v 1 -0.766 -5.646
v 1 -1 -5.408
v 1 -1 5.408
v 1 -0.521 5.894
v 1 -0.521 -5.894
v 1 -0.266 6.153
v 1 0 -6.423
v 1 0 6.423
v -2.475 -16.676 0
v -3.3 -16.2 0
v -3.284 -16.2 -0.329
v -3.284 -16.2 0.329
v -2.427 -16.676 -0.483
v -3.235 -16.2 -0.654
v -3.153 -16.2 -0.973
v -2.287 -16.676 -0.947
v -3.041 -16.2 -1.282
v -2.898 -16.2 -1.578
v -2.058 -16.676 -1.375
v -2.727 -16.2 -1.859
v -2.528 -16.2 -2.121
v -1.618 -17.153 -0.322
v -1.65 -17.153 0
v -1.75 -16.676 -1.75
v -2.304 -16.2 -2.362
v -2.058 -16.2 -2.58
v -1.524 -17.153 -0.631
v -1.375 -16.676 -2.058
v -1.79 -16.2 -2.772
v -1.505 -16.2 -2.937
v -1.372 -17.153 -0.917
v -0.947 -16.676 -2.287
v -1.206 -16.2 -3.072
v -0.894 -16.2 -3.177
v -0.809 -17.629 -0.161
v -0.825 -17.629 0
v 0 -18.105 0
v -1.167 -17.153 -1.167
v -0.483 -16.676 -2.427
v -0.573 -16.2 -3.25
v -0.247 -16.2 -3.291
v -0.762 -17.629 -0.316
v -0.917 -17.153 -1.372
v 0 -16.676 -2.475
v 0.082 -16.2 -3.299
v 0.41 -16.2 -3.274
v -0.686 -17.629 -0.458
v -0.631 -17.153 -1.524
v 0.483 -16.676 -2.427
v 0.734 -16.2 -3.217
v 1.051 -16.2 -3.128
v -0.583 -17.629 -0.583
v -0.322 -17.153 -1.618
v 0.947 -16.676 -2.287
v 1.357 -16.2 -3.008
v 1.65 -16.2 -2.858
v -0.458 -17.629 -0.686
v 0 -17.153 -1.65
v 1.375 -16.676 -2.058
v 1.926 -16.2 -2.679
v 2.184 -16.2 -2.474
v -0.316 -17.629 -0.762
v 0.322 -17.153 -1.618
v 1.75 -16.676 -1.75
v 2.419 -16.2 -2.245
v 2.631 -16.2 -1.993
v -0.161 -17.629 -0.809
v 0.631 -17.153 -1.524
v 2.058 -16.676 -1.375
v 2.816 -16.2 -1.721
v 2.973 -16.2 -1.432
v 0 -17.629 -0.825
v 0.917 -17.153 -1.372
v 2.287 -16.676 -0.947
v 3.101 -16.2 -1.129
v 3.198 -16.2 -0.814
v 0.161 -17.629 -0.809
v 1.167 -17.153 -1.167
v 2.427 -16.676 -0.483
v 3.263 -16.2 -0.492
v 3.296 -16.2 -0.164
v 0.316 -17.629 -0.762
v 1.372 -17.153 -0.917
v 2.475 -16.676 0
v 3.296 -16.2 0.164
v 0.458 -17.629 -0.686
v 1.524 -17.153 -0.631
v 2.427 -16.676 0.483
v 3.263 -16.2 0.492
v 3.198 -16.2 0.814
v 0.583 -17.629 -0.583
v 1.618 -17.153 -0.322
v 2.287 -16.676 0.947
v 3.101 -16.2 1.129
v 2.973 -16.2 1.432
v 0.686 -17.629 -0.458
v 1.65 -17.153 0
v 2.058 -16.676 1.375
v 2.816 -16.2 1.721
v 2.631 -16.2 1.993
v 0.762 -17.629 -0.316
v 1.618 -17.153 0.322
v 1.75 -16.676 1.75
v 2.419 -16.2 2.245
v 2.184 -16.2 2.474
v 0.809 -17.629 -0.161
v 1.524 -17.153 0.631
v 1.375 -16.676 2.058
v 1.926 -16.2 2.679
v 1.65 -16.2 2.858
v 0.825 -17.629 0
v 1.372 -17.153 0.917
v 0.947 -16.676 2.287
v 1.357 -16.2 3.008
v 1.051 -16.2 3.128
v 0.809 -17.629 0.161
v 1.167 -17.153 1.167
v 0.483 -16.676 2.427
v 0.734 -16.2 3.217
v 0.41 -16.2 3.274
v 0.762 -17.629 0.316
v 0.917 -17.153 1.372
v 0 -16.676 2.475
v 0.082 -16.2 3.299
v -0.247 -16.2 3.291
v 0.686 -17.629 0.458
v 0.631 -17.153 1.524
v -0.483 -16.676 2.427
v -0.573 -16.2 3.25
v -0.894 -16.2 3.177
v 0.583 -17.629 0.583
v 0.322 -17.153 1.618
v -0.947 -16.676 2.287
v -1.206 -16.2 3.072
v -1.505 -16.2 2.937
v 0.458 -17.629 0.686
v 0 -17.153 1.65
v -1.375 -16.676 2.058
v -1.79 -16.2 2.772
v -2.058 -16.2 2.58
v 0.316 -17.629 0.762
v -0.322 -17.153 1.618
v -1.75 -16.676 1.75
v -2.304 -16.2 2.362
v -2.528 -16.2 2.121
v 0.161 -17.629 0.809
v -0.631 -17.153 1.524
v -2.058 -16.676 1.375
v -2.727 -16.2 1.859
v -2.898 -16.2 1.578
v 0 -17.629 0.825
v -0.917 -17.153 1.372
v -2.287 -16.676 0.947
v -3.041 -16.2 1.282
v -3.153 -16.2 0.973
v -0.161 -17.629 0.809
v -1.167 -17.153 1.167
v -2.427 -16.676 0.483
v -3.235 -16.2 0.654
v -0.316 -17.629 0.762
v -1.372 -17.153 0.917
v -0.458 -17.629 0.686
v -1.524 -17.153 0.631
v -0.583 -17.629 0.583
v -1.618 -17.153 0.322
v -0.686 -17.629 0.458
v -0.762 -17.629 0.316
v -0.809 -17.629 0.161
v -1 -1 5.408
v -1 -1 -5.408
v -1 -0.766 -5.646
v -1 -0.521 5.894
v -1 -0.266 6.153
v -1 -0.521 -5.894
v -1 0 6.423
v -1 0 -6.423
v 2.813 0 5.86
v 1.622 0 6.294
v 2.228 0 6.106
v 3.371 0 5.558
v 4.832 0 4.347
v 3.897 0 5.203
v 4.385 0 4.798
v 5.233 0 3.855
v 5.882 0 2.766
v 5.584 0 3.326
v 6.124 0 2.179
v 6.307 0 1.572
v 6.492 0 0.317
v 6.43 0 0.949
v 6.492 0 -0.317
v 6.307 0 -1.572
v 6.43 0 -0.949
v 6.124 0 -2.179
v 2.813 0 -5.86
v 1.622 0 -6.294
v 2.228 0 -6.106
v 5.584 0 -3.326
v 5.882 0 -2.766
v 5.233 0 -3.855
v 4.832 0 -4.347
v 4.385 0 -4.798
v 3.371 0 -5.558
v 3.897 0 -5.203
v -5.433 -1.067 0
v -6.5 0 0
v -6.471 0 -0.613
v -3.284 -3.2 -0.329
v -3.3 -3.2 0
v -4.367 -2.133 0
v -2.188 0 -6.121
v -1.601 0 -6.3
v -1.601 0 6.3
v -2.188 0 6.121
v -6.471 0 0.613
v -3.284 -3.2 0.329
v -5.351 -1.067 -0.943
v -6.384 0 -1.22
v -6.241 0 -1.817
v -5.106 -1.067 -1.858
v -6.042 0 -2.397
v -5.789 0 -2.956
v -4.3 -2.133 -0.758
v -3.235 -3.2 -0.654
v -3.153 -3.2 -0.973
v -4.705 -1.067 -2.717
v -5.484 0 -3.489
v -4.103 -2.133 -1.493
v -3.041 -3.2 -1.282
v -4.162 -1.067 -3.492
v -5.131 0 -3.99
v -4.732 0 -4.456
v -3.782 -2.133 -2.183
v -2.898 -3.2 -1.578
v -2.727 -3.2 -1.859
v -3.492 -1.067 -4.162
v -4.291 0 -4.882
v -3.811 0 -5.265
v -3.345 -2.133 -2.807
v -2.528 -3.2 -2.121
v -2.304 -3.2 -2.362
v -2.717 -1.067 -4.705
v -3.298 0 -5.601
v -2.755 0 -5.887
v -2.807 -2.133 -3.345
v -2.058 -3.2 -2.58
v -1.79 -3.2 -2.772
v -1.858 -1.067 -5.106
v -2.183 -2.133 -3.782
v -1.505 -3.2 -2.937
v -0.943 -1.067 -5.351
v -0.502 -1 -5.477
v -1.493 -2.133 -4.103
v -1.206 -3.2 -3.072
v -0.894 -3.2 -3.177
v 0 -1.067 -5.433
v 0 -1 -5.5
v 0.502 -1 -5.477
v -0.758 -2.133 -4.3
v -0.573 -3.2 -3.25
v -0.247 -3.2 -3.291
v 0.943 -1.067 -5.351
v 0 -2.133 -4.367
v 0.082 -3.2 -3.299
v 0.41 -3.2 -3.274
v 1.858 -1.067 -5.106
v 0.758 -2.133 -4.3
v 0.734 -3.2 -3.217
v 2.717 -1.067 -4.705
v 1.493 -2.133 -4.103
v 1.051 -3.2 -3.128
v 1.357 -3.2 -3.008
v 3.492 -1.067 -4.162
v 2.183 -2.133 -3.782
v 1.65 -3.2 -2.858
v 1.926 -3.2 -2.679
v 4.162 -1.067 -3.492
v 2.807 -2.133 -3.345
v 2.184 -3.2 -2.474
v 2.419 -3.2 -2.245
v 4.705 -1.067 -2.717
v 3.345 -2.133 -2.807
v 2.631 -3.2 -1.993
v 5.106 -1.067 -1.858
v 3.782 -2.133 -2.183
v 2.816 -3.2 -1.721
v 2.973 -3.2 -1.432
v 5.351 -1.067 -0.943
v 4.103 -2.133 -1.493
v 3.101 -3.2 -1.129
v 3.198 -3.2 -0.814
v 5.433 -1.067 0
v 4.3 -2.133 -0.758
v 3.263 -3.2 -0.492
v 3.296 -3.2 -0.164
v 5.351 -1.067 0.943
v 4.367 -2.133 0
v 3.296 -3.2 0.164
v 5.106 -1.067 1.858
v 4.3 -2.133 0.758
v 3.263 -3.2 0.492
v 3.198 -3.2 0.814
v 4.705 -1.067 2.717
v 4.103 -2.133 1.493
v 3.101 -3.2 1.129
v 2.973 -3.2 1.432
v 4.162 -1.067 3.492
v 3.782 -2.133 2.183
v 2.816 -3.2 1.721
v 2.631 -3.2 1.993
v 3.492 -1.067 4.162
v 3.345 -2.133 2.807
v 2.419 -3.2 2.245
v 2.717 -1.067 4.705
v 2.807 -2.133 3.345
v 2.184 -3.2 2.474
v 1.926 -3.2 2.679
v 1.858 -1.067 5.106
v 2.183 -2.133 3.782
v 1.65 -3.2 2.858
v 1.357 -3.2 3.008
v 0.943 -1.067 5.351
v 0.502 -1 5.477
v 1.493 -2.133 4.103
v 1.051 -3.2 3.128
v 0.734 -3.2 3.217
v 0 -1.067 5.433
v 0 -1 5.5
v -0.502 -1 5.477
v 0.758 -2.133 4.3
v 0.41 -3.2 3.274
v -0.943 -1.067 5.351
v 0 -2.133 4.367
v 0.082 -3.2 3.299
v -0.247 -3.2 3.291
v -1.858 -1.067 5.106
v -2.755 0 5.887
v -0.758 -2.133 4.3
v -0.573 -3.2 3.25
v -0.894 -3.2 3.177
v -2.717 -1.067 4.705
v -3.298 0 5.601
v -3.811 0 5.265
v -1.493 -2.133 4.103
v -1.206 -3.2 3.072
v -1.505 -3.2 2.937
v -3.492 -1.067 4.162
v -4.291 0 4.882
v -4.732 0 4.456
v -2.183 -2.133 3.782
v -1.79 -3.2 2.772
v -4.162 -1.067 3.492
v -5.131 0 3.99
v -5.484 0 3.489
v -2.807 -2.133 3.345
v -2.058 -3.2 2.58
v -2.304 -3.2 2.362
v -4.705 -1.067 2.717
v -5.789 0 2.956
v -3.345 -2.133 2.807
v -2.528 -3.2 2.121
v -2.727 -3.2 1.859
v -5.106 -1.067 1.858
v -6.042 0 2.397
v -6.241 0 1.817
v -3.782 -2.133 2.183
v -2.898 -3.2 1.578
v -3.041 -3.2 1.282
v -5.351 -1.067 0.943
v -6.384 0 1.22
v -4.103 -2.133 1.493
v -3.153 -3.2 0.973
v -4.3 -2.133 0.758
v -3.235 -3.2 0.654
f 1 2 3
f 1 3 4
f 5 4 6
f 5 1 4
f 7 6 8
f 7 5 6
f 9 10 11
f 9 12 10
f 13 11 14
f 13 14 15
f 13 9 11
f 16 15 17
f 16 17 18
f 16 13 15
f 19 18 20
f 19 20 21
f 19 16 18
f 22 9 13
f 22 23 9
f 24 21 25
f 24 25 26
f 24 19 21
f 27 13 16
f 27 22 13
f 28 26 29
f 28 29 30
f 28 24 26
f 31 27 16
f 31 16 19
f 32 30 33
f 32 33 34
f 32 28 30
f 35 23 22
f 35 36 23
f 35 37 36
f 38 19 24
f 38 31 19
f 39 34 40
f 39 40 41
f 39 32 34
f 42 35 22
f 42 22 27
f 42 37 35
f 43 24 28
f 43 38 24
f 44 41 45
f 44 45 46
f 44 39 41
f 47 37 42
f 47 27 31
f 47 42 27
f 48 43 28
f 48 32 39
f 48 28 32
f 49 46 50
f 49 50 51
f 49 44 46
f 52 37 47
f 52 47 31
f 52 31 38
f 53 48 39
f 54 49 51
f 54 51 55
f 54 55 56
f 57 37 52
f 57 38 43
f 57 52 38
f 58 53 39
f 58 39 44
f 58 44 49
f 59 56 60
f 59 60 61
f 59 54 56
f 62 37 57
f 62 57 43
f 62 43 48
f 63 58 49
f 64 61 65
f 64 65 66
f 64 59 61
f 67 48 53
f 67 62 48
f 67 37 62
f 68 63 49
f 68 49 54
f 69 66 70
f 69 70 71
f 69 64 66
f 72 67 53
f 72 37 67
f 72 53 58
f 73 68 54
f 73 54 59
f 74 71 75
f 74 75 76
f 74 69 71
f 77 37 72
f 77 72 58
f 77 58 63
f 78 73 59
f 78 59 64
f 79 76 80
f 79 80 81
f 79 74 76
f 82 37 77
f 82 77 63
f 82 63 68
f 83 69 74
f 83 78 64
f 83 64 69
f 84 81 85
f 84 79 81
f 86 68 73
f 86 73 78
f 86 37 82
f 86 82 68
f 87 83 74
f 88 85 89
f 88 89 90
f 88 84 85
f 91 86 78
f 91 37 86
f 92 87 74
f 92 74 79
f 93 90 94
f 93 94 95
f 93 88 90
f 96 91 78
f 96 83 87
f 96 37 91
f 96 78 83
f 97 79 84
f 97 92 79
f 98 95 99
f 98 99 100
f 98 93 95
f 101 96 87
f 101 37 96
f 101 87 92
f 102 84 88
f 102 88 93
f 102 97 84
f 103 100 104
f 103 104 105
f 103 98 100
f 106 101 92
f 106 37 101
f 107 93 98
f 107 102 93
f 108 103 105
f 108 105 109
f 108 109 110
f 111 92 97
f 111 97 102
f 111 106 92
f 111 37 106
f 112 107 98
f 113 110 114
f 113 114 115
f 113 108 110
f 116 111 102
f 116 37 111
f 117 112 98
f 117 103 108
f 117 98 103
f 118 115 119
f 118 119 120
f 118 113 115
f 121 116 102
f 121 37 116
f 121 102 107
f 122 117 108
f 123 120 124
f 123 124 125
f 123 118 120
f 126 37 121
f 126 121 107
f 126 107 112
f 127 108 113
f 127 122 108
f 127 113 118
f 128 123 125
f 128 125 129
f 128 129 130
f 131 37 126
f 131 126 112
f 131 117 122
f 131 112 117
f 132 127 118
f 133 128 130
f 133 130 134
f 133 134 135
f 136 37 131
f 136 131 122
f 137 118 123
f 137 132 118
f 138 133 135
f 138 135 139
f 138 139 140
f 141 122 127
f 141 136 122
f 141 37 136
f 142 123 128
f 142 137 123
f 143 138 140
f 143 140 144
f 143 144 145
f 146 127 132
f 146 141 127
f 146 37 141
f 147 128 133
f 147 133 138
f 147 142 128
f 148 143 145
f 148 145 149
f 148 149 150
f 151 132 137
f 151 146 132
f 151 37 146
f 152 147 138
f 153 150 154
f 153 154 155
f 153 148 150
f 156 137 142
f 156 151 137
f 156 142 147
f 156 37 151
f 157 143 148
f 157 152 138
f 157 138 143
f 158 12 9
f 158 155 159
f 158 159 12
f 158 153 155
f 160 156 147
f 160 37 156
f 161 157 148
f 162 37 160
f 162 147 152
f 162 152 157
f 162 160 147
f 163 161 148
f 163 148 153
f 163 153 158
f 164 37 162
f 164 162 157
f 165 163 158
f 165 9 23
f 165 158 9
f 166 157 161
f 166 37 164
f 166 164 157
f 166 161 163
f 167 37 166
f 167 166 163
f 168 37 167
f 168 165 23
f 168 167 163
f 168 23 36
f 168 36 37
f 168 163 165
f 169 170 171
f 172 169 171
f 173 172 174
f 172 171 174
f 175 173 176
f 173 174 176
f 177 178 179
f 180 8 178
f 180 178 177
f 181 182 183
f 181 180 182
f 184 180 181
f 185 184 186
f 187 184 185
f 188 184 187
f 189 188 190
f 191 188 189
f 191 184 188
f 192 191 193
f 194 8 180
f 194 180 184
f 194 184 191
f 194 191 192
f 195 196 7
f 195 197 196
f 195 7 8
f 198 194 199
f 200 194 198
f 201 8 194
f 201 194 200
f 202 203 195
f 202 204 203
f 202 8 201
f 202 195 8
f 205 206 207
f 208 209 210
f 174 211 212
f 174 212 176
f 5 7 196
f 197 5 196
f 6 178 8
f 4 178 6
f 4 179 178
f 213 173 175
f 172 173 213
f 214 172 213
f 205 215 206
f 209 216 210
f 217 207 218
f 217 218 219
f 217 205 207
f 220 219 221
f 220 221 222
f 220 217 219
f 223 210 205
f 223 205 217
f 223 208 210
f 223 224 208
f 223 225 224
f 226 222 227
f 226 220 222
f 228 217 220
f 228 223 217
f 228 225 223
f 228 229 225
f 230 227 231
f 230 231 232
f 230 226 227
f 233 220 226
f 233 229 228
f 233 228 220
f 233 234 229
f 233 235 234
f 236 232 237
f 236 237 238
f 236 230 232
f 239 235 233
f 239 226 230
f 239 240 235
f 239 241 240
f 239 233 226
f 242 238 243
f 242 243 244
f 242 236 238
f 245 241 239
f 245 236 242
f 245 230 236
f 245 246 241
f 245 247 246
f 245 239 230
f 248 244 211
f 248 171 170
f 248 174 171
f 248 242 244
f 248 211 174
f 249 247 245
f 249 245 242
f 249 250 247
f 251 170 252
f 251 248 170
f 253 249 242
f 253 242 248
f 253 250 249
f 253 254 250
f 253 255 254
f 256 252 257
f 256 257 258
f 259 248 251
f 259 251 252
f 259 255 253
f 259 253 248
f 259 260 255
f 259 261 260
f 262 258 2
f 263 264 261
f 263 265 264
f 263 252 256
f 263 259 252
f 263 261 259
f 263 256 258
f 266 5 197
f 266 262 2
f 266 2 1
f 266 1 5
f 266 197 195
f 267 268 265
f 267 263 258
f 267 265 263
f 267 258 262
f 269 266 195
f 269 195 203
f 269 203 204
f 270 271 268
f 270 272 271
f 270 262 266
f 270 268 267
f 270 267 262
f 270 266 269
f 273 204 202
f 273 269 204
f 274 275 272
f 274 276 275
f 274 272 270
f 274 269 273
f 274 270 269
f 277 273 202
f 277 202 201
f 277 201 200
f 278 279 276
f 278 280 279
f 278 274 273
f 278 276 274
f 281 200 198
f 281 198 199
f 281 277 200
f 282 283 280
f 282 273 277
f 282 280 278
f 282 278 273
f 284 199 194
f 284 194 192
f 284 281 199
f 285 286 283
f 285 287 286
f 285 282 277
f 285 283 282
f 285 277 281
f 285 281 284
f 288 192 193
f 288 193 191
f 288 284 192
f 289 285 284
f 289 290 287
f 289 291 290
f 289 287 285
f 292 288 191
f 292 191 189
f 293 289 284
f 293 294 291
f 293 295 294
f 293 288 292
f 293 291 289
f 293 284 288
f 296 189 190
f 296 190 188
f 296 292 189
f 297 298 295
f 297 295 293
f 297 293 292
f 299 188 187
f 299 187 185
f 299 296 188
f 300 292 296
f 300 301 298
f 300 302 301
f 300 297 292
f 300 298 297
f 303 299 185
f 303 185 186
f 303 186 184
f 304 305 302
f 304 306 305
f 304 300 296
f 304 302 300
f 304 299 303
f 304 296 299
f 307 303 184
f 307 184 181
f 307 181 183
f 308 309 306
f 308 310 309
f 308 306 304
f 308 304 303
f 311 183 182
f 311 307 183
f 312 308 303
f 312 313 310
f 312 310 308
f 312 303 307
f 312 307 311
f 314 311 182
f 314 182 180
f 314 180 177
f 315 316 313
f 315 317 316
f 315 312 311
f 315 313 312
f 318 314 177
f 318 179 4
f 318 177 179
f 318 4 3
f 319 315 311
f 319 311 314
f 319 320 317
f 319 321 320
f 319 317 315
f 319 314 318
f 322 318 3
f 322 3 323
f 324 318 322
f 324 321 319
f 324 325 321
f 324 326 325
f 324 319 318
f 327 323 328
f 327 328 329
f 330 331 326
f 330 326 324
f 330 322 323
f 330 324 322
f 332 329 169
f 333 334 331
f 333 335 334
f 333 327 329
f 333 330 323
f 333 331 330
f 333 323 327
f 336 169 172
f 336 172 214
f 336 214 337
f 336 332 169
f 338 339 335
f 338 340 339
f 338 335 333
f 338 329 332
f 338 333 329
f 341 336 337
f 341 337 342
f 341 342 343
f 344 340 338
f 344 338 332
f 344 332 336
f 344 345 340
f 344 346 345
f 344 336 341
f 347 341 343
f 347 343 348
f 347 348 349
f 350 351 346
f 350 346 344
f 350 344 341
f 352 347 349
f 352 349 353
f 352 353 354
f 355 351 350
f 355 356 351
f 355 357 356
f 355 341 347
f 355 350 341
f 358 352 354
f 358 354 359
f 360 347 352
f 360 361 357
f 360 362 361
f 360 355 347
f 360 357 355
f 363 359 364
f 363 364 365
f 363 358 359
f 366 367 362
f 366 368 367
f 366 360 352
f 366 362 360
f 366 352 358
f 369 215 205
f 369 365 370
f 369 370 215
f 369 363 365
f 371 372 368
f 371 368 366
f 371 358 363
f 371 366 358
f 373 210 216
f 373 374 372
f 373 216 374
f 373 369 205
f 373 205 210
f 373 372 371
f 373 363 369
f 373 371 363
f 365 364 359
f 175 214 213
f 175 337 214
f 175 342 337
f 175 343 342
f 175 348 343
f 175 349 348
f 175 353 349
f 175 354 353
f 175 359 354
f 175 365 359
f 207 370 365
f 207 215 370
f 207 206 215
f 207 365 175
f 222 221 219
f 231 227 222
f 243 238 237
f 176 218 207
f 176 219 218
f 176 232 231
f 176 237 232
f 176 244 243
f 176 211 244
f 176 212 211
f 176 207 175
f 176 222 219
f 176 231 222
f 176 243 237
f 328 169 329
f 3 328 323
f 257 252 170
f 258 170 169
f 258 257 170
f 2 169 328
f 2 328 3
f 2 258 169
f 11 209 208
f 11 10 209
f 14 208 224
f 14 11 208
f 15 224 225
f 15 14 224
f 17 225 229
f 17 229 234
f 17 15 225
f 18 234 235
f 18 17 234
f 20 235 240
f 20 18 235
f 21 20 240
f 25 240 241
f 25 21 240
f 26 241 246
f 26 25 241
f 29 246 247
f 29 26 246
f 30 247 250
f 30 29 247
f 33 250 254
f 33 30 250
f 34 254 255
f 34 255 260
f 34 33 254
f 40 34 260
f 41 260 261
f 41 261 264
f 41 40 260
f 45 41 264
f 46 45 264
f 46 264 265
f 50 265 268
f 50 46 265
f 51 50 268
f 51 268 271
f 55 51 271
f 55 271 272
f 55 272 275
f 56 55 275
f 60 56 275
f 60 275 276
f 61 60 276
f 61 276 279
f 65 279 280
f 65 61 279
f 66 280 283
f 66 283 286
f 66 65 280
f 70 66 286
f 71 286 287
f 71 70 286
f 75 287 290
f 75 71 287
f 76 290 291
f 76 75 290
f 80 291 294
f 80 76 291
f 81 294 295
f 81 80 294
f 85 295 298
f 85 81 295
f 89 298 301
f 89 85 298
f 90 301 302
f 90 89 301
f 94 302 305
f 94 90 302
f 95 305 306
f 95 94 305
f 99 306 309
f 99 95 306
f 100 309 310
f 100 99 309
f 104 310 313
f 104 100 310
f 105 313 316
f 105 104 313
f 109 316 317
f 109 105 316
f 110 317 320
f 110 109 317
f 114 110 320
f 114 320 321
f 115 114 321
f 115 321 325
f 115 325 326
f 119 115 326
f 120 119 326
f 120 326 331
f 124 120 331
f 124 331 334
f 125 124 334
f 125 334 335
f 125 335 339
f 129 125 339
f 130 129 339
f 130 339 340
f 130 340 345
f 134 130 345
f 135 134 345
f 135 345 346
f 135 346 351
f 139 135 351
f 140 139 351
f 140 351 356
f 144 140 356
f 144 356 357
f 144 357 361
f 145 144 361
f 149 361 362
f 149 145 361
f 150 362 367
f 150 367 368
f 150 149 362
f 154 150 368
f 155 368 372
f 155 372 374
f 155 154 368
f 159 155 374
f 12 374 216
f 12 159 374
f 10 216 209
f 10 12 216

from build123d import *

# Parameters (mm, degrees)
CUT_EXTRUDE1_DEPTH      = 21.305178915
CUT_EXTRUDE1_DEPTH_BACK = 21.305178915
SKETCH2_W               = 2
SKETCH2_H               = 1


with BuildPart() as part:
    # Sketch1 → Revolve1 (revolve)
    with BuildSketch(Plane.XY):
        Polygon((-6.5, 0), (-3.3, -3.2), (-3.3, -16.2), (0, -18.105255888), (0, 0), align=None)
    revolve(axis=Axis((0, 0, 0), (0, -1, 0)))

    # Sketch2 → Cut-Extrude1 (cut, two sides: drawn at the far end of the back side and taken through both)
    with BuildSketch(Plane.XY.offset(-CUT_EXTRUDE1_DEPTH_BACK)):
        with Locations((0, -0.5)):
            Rectangle(SKETCH2_W, SKETCH2_H)
    extrude(amount=CUT_EXTRUDE1_DEPTH + CUT_EXTRUDE1_DEPTH_BACK, mode=Mode.SUBTRACT)


solid = part.part
